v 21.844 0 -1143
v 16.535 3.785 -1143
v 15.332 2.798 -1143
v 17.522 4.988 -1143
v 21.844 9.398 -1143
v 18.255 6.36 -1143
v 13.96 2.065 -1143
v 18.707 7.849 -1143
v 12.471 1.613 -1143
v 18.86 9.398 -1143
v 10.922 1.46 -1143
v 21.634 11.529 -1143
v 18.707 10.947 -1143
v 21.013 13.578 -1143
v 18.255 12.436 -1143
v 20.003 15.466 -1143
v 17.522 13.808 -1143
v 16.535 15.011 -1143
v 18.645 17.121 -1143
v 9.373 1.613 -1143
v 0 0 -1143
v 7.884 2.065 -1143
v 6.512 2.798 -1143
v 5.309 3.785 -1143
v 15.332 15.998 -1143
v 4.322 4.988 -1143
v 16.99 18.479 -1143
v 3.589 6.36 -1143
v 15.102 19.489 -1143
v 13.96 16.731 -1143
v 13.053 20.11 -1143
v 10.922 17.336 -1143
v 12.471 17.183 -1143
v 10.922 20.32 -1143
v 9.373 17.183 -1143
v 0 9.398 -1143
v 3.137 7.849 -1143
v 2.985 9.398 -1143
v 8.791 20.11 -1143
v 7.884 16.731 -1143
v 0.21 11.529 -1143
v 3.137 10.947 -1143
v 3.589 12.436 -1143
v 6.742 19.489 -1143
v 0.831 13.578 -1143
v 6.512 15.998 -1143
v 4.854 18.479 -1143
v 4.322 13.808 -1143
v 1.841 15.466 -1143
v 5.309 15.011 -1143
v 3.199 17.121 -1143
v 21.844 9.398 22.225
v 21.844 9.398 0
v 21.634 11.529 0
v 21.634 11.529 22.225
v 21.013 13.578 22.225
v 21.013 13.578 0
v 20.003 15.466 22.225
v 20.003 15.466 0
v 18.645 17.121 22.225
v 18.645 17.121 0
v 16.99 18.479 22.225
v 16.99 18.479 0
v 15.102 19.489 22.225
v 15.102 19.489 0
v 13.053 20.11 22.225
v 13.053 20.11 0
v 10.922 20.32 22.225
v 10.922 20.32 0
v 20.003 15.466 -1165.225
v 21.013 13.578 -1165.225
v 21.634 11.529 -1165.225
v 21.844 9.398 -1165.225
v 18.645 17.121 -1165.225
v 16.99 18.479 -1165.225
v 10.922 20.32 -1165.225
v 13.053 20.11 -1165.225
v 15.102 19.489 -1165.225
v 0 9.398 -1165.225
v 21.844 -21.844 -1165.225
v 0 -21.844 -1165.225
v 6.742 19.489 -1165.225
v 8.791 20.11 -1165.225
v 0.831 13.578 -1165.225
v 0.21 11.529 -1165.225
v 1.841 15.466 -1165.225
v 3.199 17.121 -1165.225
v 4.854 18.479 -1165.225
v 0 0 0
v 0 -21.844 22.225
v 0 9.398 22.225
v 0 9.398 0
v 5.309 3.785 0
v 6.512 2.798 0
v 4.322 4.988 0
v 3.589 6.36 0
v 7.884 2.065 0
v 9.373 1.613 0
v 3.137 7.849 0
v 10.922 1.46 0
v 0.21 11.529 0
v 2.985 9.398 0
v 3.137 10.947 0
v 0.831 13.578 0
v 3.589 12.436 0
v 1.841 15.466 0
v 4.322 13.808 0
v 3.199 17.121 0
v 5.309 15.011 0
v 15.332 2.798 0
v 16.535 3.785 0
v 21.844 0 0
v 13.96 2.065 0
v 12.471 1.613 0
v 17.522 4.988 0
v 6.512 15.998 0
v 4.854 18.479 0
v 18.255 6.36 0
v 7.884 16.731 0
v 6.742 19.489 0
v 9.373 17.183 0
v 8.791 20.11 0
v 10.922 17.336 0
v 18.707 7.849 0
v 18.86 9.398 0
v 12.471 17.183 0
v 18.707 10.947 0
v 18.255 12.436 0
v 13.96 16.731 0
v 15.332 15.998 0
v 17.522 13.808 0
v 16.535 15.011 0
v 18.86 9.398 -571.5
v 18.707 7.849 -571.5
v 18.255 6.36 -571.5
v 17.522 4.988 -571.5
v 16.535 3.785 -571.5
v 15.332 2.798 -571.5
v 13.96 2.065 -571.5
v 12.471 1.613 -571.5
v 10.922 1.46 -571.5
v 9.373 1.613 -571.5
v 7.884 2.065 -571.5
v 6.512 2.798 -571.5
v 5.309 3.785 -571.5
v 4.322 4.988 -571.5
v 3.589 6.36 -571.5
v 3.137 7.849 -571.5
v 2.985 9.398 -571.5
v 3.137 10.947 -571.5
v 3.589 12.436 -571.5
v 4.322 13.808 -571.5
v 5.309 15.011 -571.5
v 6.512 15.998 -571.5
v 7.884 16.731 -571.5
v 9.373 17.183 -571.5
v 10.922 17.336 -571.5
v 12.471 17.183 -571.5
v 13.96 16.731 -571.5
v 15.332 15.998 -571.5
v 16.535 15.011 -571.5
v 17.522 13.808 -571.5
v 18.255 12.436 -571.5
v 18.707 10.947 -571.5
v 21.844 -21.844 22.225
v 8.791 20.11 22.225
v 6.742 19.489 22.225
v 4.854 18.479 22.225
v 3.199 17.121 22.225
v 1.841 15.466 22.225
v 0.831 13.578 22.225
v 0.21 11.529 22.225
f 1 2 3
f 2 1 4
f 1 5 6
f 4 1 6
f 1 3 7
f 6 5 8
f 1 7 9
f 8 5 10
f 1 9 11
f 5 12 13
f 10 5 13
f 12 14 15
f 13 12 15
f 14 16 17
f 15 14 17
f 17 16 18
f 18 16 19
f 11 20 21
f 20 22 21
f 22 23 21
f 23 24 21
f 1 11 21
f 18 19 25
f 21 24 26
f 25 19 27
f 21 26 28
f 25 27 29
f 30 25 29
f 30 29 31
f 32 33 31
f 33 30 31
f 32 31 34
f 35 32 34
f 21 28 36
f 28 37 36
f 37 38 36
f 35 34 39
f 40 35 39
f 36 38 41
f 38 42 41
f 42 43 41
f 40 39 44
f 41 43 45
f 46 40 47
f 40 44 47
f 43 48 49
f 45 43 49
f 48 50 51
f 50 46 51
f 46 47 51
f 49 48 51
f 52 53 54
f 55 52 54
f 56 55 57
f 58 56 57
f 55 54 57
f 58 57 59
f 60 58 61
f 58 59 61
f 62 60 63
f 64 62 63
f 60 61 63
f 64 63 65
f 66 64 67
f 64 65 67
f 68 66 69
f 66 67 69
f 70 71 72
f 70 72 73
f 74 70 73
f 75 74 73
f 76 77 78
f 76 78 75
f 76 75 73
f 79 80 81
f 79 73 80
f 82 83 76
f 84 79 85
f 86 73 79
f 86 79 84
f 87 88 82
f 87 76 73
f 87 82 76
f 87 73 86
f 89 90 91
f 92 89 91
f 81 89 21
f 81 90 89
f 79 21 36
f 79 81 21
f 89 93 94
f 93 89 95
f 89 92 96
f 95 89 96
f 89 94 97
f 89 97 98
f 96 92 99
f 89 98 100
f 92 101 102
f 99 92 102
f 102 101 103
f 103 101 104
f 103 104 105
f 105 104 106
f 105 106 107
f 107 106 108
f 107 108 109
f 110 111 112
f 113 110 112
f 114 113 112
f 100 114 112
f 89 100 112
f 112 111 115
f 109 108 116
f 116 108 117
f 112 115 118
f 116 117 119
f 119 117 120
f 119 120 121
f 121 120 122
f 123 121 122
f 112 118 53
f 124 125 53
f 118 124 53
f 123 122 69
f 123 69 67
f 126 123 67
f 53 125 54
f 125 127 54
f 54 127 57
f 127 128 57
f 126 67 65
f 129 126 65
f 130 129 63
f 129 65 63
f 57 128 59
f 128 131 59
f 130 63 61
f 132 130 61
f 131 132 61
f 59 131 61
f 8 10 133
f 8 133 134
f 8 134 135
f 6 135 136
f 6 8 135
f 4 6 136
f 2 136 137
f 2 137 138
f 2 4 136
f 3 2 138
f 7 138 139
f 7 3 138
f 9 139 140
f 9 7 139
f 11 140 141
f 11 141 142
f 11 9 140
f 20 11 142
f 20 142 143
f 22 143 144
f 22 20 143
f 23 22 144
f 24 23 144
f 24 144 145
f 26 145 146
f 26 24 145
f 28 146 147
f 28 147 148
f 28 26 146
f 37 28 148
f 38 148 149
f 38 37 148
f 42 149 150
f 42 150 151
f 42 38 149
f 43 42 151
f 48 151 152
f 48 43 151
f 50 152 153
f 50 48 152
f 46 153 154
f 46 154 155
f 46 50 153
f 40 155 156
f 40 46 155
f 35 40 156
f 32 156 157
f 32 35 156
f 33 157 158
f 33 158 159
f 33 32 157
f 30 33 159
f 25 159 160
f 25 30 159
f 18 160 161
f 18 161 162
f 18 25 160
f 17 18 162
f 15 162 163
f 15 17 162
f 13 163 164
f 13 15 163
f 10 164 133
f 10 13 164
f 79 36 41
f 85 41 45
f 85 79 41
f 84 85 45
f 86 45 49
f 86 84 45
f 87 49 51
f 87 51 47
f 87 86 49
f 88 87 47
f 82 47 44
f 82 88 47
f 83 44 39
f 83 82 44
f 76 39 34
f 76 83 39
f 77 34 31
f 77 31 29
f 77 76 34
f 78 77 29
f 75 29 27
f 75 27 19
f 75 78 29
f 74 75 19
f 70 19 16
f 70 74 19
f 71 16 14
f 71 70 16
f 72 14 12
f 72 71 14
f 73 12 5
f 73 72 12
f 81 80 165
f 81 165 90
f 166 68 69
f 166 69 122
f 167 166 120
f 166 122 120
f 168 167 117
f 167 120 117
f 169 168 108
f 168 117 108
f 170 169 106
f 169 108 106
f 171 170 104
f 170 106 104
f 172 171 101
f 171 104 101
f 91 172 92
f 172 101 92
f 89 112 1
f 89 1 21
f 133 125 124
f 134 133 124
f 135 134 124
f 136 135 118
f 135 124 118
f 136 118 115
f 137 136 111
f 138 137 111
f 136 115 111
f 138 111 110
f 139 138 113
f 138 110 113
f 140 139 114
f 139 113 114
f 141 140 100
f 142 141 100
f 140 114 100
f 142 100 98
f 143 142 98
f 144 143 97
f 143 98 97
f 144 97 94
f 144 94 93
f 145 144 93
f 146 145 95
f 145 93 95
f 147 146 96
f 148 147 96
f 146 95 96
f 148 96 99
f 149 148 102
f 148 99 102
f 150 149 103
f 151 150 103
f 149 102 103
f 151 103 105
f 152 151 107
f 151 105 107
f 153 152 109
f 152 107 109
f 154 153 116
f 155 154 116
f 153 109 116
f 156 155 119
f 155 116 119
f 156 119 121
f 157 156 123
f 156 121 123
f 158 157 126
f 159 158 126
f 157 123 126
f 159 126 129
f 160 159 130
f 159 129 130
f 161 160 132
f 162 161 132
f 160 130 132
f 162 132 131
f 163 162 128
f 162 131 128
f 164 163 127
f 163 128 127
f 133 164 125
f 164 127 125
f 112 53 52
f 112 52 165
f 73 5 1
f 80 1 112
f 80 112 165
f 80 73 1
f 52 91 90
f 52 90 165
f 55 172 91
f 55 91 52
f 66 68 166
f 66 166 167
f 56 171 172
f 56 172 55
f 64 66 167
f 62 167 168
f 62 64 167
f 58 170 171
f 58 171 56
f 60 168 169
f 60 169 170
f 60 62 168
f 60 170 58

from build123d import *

# Parameters (mm, degrees)
SKETCH1_R           = 10.922
SKETCH1_W           = 21.844
SKETCH1_H           = 21.844
BOSS_EXTRUDE1_DEPTH = 22.225
SKETCH2_R           = 7.9375
SKETCH2_W           = 21.844
SKETCH2_H           = 21.844
BOSS_EXTRUDE2_DEPTH = 571.5
BOSS_EXTRUDE3_START = 22.225
SKETCH3_R           = 10.922
SKETCH3_R_2         = 7.9375
BOSS_EXTRUDE3_DEPTH = 22.225


with BuildPart() as part:
    # Sketch1 → Boss-Extrude1 (new body)
    with BuildSketch(Plane.XY):
        with BuildLine():
            Line((0, 9.398), (0, 0))
            Line((0, 0), (5.357138816, 0))
            ThreePointArc((5.357138816, 0), (1.433335767, 3.989179882), (0, 9.398))
        make_face()
        with BuildLine():
            ThreePointArc((0, 9.398), (1.433335767, 3.989179882), (5.357138816, 0))
            Line((5.357138816, 0), (10.922, 0))
            Line((10.922, 0), (10.922, 9.398))
            Line((10.922, 9.398), (10.922, 20.32))
            ThreePointArc((10.922, 20.32), (3.198979736, 17.121020264), (0, 9.398))
        make_face()
        with BuildLine():
            Line((10.922, 9.398), (10.922, 0))
            Line((10.922, 0), (16.486861184, 0))
            ThreePointArc((16.486861184, 0), (20.410664233, 3.989179882), (21.844, 9.398))
            ThreePointArc((21.844, 9.398), (18.645020264, 17.121020264), (10.922, 20.32))
            Line((10.922, 20.32), (10.922, 9.398))
        make_face()
        with BuildLine():
            ThreePointArc((21.844, 9.398), (20.410664233, 3.989179882), (16.486861184, 0))
            Line((16.486861184, 0), (21.844, 0))
            Line((21.844, 0), (21.844, 9.398))
        make_face()
        with BuildLine():
            Line((10.922, 0), (5.357138816, 0))
            ThreePointArc((5.357138816, 0), (10.922, -1.524), (16.486861184, 0))
            Line((16.486861184, 0), (10.922, 0))
        make_face()
        with Locations((10.922, 9.398)):
            Circle(SKETCH1_R)
        with Locations((10.922, -10.922)):
            Rectangle(SKETCH1_W, SKETCH1_H)
    extrude(amount=BOSS_EXTRUDE1_DEPTH)

    # Sketch2 → Boss-Extrude2 (add)
    with BuildSketch(Plane(origin=(0, 0, 0), x_dir=(-1, 0, 0), z_dir=(0, 0, -1))):
        with Locations(Location((-10.922, 9.398, 0), (0, 0, 180))):
            Circle(SKETCH2_R)
        with Locations((-10.922, -10.922)):
            Rectangle(SKETCH2_W, SKETCH2_H)
    boss_extrude2 = extrude(amount=BOSS_EXTRUDE2_DEPTH)

    # Mirror1: Boss-Extrude2 across plane
    add(boss_extrude2.mirror(Plane.XY.offset(-571.5)))

    # Sketch3 → Boss-Extrude3 (add)
    # profile 1 of 3: a face of its own
    with BuildSketch(Plane(origin=(0, 0, -1143), x_dir=(-1, 0, 0), z_dir=(0, 0, -1)).offset(BOSS_EXTRUDE3_START)):
        with BuildLine():
            Line((-21.844, -21.844), (0, -21.844))
            Line((0, -21.844), (0, 9.398))
            ThreePointArc((0, 9.398), (-10.922, -1.524), (-21.844, 9.398))
            Line((-21.844, 9.398), (-21.844, -21.844))
        make_face()
    # profile 2 of 3: a face of its own
    with BuildSketch(Plane(origin=(0, 0, -1143), x_dir=(-1, 0, 0), z_dir=(0, 0, -1)).offset(BOSS_EXTRUDE3_START)):
        with Locations((-10.922, 9.398)):
            Circle(SKETCH3_R)
        with Locations(Location((-10.922, 9.398, 0), (0, 0, 180))):
            Circle(SKETCH3_R_2, mode=Mode.SUBTRACT)
    # profile 3 of 3: a face of its own
    with BuildSketch(Plane(origin=(0, 0, -1143), x_dir=(-1, 0, 0), z_dir=(0, 0, -1)).offset(BOSS_EXTRUDE3_START)):
        with Locations(Location((-10.922, 9.398, 0), (0, 0, 180))):
            Circle(SKETCH3_R_2)
    extrude(amount=-BOSS_EXTRUDE3_DEPTH)


solid = part.part
